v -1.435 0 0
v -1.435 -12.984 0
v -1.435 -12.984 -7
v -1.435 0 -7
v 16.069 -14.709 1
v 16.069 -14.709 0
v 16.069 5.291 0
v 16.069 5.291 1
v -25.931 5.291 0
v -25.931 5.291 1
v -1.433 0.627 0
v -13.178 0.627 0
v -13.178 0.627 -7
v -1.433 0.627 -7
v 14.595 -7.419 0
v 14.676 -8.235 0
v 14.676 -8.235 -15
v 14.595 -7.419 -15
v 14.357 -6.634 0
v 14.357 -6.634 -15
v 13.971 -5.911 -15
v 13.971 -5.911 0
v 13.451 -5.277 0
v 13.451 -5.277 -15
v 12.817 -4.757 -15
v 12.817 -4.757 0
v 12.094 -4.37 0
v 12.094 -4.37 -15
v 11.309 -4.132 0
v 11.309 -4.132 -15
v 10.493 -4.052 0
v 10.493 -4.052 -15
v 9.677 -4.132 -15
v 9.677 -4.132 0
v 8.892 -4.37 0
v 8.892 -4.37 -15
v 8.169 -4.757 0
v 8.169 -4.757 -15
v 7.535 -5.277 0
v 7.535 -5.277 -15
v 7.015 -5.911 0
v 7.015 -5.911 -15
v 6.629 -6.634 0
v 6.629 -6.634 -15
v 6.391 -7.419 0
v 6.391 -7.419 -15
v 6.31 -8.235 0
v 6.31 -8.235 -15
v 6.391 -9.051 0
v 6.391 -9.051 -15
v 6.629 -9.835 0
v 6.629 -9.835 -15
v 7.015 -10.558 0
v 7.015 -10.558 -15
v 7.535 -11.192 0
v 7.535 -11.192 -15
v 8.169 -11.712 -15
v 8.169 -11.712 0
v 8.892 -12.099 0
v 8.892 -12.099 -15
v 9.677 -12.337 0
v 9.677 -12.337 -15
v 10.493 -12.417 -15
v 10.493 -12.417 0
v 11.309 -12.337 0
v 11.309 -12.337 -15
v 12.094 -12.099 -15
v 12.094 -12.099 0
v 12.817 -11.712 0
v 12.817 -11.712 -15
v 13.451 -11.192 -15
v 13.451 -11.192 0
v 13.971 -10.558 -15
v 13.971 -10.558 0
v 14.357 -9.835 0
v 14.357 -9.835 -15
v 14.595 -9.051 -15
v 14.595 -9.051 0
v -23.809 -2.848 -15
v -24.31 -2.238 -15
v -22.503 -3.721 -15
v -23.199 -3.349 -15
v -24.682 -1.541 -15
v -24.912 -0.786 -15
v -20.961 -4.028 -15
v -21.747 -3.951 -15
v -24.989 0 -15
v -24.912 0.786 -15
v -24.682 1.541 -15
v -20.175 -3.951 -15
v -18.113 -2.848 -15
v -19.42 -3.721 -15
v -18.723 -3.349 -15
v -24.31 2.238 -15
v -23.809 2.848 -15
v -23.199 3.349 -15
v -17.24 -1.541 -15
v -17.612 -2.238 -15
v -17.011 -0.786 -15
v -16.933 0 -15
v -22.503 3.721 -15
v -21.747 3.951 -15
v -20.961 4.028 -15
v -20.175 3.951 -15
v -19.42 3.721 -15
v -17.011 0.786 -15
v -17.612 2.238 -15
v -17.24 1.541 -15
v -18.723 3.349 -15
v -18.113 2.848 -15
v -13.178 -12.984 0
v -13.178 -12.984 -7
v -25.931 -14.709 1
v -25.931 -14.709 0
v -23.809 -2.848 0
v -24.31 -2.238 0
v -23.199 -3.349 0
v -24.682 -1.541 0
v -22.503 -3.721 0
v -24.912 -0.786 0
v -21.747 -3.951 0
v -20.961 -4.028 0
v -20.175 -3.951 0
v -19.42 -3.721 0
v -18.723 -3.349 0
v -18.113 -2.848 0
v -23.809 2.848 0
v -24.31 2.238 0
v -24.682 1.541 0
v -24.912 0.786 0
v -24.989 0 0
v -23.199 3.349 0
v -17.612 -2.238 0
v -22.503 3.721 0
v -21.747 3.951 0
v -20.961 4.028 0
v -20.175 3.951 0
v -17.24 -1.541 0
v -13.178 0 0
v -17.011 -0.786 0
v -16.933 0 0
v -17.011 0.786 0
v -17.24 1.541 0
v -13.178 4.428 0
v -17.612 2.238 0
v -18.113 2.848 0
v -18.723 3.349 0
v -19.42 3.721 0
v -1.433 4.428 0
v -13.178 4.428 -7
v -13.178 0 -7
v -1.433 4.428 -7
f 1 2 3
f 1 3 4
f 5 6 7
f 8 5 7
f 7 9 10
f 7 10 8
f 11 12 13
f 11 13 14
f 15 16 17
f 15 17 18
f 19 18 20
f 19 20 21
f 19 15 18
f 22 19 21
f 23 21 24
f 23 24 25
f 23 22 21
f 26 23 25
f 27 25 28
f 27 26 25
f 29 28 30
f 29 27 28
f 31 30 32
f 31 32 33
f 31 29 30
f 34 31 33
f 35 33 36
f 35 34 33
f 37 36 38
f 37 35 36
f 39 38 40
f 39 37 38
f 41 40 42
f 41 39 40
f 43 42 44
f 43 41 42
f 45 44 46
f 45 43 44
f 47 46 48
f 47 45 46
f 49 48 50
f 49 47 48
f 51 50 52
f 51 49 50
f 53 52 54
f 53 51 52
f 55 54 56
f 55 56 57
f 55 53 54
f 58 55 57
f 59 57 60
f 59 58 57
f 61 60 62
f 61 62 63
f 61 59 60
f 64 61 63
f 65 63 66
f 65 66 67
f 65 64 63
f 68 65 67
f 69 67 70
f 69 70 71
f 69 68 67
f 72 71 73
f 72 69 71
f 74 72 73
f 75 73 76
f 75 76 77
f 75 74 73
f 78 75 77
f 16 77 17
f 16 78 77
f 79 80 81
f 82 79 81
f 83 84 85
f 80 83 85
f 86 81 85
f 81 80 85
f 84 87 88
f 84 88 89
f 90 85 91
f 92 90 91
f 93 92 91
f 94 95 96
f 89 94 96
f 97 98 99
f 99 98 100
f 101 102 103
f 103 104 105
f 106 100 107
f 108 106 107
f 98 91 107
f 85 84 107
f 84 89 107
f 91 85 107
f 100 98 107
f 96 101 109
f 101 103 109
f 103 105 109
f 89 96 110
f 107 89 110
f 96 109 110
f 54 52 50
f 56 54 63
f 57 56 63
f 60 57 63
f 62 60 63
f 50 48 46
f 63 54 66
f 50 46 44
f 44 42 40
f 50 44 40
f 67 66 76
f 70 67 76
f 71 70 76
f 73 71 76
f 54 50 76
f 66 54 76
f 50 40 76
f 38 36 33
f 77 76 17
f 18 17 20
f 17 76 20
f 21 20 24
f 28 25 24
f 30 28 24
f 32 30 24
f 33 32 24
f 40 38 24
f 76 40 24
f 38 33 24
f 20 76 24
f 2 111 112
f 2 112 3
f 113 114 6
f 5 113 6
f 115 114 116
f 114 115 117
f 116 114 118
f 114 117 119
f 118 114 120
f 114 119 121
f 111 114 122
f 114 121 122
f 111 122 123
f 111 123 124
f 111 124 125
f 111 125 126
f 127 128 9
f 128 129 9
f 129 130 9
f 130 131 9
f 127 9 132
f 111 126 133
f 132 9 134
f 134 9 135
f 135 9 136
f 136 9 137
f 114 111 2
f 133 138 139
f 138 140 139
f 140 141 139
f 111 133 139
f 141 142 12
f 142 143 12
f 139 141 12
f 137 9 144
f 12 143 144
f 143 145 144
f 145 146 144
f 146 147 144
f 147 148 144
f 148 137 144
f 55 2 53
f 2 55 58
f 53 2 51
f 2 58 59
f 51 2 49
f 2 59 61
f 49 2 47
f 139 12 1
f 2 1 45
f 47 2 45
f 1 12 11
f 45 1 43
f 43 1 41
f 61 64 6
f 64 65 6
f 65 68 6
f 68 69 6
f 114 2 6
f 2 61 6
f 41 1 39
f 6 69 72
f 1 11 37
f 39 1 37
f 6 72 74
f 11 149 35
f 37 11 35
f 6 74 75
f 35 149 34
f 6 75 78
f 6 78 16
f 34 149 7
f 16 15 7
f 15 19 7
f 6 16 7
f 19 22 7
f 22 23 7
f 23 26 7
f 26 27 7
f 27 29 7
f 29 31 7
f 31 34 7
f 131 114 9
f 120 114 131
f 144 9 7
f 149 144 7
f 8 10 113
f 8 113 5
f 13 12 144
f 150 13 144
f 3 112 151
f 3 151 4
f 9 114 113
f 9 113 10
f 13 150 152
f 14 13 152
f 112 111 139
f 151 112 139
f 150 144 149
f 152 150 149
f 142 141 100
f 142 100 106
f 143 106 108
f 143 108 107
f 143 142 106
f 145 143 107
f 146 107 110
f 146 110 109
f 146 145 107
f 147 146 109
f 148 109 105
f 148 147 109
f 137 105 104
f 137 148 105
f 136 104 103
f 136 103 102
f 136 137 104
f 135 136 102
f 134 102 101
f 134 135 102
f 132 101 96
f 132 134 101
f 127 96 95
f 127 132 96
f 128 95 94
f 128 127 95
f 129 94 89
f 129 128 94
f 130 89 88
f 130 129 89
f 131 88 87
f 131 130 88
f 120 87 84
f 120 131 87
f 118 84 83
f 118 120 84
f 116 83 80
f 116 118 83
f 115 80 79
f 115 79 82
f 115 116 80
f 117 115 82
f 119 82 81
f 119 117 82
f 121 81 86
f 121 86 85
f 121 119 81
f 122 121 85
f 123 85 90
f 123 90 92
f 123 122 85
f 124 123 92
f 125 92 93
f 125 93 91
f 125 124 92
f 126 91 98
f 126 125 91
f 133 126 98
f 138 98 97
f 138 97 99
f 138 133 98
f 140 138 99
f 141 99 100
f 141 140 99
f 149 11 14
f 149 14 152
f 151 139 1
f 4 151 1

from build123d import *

# Parameters (mm, degrees)
SKETCH1_W           = 42
SKETCH1_H           = 20
BOSS_EXTRUDE1_DEPTH = 1
SKETCH2_R           = 4.027938591
SKETCH2_R_2         = 4.182706726
BOSS_EXTRUDE2_DEPTH = 15
SKETCH3_W           = 11.745093392
SKETCH3_H           = 3.800746796
SKETCH3_W_2         = 11.743469105
SKETCH3_H_2         = 12.98355877
BOSS_EXTRUDE3_DEPTH = 7


with BuildPart() as part:
    # Sketch1 → Boss-Extrude1 (new body)
    with BuildSketch(Plane.XY):
        with Locations((-4.931174089, -4.708502024)):
            Rectangle(SKETCH1_W, SKETCH1_H)
    extrude(amount=BOSS_EXTRUDE1_DEPTH)

    # Sketch2 → Boss-Extrude2 (add)
    with BuildSketch(Plane.XY):
        with Locations((-20.961145163, 0)):
            Circle(SKETCH2_R)
        with Locations((10.49307608, -8.234663003)):
            Circle(SKETCH2_R_2)
    extrude(amount=-BOSS_EXTRUDE2_DEPTH)

    # Sketch3 → Boss-Extrude3 (add)
    with BuildSketch(Plane.XY):
        with Locations((-7.305637446, 2.527727406)):
            Rectangle(SKETCH3_W, SKETCH3_H)
        with Locations((-7.30644959, -6.491779385)):
            Rectangle(SKETCH3_W_2, SKETCH3_H_2)
    extrude(amount=-BOSS_EXTRUDE3_DEPTH)


solid = part.part
